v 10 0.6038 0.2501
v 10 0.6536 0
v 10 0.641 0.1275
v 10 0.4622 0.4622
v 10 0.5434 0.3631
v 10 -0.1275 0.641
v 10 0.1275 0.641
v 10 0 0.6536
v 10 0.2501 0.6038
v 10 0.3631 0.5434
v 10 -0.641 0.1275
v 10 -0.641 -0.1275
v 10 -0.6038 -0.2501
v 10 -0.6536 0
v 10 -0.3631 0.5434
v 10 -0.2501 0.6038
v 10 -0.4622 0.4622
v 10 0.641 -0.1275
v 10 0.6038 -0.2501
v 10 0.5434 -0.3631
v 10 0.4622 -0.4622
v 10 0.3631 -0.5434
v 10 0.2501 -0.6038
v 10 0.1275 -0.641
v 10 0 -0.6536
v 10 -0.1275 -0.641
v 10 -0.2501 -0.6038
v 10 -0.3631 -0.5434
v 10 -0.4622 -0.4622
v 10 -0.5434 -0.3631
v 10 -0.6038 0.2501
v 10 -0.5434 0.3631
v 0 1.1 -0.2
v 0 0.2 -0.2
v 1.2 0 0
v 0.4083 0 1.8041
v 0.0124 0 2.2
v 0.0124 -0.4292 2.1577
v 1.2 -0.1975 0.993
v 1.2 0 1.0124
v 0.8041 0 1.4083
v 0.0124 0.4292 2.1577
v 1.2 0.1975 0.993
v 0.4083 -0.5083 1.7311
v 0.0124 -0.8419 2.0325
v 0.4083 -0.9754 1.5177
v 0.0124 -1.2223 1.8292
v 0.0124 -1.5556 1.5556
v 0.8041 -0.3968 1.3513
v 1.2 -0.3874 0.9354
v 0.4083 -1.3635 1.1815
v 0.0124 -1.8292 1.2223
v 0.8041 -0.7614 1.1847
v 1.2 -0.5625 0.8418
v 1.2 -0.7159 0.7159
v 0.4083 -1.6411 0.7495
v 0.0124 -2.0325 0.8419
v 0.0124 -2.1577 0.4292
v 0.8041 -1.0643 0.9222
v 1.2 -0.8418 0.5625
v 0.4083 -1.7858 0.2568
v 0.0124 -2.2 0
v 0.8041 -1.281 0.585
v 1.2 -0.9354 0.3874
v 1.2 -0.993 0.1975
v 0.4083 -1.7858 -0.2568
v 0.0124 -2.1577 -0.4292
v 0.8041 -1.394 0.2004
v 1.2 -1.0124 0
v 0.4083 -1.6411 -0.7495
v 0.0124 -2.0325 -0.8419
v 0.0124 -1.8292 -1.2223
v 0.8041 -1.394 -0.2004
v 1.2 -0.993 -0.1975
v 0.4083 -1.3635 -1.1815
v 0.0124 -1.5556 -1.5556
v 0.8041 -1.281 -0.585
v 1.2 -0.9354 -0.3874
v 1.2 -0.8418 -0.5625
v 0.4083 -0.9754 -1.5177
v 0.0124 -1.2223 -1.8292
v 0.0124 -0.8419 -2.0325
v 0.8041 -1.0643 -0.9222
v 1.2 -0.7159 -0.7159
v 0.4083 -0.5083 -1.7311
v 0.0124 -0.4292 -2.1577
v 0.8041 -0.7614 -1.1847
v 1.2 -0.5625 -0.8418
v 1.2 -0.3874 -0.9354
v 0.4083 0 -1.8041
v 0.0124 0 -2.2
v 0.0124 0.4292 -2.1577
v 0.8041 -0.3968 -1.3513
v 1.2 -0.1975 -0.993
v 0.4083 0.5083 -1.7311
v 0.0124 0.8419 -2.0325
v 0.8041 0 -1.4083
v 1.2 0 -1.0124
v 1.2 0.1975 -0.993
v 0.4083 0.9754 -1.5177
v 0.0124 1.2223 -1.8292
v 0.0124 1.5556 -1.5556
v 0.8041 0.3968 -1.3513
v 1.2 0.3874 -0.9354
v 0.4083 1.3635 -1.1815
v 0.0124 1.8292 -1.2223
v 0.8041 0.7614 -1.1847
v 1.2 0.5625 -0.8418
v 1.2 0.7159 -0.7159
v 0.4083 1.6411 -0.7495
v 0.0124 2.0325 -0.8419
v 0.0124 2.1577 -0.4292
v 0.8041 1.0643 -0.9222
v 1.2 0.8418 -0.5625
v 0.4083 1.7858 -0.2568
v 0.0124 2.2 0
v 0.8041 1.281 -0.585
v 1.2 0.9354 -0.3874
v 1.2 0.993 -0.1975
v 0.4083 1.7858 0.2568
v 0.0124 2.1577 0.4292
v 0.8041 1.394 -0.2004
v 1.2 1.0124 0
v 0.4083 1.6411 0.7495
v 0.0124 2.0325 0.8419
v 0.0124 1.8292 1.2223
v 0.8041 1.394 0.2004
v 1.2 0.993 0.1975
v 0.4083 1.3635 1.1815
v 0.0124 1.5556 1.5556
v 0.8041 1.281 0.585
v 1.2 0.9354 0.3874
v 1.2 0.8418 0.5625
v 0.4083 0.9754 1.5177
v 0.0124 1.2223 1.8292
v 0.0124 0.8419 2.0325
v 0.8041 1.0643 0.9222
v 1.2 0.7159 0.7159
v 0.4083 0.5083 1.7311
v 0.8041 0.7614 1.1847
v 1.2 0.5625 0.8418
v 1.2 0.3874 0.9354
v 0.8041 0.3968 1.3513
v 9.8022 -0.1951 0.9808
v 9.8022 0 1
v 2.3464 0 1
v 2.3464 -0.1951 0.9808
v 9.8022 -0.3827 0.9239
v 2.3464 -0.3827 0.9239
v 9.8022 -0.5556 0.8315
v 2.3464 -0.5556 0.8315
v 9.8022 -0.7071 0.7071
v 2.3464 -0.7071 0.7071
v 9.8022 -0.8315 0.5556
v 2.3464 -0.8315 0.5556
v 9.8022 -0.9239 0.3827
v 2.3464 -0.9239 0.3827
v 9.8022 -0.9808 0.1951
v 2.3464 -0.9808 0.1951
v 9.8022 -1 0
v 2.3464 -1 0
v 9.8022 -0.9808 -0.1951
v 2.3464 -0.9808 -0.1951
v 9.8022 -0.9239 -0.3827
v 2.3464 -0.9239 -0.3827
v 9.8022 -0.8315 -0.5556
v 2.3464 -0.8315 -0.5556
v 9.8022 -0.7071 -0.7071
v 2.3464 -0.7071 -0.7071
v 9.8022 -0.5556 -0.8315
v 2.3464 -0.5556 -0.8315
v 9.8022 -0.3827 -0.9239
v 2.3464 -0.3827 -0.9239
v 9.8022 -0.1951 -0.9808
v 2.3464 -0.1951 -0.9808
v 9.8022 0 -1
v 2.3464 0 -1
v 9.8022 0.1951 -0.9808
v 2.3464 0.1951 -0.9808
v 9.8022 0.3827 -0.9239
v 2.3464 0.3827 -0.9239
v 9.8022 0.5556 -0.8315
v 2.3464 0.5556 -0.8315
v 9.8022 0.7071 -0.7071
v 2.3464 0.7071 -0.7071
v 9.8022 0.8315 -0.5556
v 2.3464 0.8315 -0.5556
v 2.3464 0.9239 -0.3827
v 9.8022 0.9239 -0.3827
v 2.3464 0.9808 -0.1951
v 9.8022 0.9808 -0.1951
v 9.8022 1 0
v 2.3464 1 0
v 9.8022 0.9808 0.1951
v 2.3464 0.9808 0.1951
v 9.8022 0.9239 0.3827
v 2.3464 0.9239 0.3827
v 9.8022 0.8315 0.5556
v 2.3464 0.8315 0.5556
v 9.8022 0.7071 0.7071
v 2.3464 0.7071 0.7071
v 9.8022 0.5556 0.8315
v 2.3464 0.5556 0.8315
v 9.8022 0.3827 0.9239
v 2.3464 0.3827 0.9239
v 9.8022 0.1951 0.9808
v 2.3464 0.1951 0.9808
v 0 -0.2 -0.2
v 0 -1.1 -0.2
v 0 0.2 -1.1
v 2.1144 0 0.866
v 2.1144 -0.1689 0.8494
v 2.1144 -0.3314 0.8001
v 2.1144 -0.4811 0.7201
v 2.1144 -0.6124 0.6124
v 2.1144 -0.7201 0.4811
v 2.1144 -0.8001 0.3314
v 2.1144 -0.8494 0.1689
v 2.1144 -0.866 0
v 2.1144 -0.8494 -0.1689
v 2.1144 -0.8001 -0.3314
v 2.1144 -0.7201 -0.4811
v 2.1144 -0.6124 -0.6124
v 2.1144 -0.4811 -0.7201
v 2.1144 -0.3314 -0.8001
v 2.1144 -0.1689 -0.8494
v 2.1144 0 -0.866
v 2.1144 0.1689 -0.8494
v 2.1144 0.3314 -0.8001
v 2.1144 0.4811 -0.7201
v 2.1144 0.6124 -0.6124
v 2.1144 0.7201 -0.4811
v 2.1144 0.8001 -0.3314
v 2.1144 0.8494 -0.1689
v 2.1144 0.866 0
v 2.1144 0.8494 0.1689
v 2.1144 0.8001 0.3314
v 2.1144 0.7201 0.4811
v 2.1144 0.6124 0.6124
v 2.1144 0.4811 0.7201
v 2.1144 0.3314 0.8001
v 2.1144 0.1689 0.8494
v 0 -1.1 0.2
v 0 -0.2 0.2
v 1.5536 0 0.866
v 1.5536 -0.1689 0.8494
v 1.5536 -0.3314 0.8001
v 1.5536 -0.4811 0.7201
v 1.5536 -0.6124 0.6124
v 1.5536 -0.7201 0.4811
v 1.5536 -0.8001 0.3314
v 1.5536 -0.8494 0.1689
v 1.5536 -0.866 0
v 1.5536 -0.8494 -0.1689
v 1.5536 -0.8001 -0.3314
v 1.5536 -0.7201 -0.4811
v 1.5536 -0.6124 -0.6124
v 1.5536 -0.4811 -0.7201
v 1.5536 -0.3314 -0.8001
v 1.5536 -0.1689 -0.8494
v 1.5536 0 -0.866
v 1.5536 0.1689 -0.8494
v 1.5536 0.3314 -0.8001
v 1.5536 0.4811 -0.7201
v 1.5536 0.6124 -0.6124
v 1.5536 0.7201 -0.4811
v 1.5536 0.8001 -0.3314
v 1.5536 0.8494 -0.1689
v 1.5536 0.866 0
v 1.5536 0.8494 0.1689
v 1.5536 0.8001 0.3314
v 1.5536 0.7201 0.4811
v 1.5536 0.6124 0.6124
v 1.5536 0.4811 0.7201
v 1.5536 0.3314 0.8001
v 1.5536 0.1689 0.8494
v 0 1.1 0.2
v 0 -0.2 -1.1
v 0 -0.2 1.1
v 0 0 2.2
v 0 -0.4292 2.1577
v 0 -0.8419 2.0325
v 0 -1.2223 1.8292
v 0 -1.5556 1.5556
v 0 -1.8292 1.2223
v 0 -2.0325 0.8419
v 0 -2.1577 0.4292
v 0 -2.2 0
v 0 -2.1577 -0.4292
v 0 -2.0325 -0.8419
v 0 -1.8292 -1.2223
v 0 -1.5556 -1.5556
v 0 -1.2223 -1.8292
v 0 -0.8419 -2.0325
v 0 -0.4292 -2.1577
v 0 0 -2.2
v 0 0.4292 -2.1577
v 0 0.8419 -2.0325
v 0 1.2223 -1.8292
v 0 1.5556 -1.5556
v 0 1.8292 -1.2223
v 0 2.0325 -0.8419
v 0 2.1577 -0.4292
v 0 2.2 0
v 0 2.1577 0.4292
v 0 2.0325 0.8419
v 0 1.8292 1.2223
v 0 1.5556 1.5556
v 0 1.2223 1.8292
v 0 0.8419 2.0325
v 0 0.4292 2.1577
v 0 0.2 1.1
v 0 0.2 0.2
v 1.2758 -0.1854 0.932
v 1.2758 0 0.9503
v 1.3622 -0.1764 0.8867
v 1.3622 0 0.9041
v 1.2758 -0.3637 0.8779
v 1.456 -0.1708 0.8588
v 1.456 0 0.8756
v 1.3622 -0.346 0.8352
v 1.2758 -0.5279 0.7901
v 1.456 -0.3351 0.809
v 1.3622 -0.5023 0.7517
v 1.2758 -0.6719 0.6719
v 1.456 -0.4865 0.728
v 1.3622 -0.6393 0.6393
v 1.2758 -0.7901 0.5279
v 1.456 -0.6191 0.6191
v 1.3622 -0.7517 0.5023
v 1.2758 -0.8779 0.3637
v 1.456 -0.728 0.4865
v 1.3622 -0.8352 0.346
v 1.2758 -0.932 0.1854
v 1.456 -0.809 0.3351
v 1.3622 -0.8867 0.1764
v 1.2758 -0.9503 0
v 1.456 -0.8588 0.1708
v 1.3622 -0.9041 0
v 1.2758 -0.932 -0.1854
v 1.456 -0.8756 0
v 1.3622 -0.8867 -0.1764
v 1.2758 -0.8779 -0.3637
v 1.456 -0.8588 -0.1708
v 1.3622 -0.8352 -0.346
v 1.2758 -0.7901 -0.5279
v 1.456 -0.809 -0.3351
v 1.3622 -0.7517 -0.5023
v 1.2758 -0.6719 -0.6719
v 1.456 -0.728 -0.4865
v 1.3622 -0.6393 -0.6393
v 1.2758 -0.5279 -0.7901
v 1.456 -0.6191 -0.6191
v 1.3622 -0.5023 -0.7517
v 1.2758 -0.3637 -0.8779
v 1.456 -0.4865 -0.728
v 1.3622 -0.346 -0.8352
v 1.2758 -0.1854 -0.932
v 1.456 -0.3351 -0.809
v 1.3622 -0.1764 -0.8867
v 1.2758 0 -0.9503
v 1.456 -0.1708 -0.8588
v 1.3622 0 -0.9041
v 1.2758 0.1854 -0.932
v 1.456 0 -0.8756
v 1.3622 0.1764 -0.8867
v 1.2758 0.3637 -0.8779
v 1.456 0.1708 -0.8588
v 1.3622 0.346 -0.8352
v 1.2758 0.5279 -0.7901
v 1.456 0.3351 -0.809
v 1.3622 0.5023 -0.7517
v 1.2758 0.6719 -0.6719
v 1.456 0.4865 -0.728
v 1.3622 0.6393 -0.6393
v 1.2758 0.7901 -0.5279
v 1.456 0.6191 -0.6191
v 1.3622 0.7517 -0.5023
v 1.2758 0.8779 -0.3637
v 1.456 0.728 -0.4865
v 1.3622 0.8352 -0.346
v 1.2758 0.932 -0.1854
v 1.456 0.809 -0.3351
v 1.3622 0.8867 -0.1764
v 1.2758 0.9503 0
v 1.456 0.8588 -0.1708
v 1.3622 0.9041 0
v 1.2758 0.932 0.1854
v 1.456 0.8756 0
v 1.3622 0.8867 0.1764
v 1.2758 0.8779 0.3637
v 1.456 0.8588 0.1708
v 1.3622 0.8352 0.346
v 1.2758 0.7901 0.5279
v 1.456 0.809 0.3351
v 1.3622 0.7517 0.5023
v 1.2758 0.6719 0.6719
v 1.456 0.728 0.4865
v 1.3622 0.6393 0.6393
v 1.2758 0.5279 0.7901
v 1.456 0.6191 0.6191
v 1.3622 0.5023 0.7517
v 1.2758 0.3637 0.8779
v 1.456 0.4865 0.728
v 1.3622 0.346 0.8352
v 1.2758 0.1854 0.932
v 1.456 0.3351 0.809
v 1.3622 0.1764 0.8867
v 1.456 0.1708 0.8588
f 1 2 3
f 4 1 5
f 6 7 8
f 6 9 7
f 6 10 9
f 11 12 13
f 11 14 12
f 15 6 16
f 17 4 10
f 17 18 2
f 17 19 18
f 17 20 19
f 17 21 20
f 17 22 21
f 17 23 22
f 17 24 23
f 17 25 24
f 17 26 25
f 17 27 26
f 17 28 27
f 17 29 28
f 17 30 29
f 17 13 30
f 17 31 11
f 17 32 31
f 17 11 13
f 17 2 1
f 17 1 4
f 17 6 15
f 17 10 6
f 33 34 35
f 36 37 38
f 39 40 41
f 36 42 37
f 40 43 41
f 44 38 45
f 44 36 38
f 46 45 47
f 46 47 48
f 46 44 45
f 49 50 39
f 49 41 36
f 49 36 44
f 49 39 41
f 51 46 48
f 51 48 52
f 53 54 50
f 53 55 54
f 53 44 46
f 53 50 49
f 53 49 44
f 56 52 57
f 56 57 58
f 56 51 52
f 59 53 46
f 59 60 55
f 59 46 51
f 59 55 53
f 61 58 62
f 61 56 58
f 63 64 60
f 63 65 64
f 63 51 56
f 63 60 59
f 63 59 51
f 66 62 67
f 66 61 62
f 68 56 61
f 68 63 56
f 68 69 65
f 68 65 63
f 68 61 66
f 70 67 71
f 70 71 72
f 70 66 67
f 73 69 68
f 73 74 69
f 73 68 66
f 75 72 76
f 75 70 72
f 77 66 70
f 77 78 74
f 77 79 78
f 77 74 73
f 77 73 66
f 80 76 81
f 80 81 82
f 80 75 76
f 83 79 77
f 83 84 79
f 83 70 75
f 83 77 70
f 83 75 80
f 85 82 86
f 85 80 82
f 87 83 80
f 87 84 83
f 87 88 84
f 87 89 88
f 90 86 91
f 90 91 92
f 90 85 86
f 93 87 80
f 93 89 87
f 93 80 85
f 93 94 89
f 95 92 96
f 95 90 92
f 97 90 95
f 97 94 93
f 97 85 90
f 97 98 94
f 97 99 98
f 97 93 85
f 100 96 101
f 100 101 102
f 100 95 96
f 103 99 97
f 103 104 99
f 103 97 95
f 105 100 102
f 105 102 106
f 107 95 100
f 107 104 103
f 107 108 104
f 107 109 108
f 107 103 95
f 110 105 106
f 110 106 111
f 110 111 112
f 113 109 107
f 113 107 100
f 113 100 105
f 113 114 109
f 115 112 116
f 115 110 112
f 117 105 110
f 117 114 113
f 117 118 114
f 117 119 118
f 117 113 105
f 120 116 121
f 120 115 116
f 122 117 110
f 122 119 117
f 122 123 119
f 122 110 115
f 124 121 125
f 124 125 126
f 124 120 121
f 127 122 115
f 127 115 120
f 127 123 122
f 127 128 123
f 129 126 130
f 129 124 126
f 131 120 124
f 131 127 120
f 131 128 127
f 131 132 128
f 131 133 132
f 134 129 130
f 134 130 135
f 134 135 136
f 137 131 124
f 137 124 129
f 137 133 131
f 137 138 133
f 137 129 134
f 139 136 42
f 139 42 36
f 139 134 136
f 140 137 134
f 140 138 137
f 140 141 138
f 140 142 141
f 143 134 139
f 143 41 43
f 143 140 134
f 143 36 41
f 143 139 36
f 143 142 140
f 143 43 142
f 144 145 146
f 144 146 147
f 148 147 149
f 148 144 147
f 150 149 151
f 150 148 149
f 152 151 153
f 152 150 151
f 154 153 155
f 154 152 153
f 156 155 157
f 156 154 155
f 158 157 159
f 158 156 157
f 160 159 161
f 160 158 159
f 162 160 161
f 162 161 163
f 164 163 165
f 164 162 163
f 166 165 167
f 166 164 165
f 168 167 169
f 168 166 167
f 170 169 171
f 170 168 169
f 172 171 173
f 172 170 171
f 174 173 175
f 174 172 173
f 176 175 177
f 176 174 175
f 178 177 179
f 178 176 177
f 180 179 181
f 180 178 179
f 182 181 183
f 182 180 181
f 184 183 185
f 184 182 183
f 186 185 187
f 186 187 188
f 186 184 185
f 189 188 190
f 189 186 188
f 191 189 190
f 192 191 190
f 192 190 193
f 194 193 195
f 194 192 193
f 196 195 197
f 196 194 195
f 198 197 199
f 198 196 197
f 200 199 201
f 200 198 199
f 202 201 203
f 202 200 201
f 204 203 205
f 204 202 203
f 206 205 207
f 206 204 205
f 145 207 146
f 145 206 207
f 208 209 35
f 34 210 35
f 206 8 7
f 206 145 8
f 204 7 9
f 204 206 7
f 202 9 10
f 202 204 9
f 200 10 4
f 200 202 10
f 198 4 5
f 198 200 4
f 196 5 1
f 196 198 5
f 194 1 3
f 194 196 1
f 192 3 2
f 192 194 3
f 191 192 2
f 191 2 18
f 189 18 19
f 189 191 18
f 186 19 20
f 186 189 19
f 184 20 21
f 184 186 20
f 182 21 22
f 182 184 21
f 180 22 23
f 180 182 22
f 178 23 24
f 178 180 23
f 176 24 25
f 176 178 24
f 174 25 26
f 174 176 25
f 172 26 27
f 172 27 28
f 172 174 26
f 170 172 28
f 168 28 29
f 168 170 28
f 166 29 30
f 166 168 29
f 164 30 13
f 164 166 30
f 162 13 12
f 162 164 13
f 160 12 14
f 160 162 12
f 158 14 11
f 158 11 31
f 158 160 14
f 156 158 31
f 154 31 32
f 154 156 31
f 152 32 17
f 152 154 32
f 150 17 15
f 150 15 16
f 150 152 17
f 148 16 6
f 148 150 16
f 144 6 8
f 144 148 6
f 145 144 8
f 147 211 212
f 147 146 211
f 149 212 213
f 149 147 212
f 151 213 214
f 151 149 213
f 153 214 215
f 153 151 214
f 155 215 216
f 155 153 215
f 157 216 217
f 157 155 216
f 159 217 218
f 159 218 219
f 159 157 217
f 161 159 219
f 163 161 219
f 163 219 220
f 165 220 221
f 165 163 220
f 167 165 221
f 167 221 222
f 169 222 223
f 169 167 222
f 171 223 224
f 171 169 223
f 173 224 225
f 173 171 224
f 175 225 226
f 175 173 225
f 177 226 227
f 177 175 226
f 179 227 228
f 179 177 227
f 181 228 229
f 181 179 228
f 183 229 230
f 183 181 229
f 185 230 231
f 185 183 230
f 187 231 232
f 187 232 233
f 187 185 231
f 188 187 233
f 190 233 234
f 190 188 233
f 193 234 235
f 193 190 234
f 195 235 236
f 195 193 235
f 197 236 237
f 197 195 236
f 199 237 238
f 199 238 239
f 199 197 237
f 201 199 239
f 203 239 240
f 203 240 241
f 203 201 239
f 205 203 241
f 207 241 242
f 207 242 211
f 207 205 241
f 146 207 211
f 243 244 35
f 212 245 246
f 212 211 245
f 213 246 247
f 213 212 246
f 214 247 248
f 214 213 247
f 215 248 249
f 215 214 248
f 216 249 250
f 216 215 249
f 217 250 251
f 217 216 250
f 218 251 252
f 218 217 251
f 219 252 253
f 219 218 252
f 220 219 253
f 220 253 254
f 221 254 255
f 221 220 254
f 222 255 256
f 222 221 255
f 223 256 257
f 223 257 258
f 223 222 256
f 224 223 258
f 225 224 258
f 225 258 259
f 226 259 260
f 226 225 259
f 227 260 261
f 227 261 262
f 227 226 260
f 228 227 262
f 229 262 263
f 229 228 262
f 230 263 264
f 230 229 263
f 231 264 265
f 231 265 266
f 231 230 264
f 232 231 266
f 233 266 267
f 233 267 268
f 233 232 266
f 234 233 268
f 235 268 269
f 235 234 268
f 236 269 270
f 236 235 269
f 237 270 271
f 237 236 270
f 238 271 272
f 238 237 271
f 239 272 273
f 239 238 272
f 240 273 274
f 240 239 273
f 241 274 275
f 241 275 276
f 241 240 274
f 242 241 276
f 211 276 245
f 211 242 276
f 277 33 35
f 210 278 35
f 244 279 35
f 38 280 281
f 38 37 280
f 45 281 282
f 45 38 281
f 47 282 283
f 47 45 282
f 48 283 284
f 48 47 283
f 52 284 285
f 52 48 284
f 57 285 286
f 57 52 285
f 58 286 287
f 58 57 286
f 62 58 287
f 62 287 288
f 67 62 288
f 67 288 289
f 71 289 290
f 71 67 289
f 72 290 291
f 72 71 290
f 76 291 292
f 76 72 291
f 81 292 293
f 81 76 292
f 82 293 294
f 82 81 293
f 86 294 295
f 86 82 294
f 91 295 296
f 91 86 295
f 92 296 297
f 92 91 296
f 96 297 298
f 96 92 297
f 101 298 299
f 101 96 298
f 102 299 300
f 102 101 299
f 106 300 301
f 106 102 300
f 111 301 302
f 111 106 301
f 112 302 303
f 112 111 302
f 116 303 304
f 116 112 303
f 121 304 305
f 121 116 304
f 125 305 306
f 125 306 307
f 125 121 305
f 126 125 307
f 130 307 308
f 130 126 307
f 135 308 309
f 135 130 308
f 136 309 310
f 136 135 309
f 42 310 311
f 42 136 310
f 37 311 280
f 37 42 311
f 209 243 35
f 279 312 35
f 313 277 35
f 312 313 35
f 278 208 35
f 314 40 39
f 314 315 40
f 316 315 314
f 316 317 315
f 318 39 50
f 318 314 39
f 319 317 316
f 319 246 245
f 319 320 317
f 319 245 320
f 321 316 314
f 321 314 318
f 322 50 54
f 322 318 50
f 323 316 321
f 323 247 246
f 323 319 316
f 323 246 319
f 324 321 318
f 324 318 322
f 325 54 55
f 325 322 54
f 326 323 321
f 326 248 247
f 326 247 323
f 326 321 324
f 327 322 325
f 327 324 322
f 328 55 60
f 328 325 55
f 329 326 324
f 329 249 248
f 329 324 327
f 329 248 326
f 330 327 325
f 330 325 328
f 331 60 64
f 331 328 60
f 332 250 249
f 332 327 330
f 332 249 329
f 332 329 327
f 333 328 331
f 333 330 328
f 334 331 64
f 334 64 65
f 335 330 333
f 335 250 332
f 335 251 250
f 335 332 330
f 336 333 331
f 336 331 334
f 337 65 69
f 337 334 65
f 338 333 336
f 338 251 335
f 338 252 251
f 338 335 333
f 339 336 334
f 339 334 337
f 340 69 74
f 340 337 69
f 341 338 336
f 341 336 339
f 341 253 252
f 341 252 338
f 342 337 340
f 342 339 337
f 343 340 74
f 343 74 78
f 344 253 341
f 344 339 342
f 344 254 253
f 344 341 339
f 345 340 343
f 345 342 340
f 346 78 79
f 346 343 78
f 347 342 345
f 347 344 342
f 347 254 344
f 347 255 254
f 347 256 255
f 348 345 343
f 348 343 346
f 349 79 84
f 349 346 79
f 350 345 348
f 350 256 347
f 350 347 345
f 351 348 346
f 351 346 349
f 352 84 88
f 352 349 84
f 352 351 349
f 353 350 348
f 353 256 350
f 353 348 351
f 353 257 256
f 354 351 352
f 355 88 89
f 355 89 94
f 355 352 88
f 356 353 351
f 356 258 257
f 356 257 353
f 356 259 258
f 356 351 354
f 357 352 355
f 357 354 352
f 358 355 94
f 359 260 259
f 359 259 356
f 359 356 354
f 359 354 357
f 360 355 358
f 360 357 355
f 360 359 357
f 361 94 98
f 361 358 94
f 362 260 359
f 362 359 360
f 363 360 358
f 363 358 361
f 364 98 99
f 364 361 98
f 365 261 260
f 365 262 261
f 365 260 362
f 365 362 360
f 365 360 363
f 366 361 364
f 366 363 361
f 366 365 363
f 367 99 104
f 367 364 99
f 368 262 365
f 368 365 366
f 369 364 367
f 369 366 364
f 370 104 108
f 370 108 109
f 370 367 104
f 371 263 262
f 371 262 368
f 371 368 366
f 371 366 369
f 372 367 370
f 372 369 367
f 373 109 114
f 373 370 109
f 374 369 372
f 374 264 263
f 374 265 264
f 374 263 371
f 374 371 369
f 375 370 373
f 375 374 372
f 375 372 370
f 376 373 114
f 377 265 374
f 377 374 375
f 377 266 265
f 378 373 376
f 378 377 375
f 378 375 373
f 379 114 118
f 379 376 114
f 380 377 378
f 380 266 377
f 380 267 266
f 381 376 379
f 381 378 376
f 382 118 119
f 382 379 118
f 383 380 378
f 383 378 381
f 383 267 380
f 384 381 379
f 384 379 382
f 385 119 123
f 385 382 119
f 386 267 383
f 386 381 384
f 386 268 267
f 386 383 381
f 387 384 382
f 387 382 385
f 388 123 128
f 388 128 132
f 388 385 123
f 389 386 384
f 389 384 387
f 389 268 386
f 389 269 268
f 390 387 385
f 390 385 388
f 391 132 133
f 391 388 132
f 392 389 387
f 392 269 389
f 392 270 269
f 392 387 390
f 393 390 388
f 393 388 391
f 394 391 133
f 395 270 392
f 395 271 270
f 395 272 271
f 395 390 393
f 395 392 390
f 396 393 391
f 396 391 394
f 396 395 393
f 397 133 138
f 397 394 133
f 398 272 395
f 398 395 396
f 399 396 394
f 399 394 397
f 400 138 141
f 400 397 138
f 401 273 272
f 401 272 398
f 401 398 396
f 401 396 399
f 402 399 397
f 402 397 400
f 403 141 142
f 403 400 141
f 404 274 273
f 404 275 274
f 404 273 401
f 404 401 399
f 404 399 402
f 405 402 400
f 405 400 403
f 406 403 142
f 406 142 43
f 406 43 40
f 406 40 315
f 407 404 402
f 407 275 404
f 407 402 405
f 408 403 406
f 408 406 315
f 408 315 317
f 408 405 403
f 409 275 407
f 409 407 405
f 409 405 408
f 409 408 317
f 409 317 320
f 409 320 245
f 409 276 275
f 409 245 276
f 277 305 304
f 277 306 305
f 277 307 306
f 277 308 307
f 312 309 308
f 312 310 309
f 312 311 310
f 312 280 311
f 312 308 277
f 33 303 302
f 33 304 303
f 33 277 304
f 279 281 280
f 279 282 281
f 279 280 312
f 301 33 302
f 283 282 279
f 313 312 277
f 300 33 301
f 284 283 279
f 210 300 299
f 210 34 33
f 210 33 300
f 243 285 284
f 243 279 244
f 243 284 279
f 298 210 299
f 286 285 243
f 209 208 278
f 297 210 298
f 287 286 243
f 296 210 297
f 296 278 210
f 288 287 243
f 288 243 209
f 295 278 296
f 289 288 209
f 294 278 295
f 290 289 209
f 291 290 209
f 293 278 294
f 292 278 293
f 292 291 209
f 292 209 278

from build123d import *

# Parameters (mm, degrees)
PATTERN_CIRCULAR_1_COUNT = 2
PATTERN_CIRCULAR_1_ANGLE = 90


with BuildPart() as part:
    # 草图1 → Revolve 766 (revolve)
    with BuildSketch(Plane.XY, mode=Mode.PRIVATE) as revolve_766_sk:
        with BuildLine():
            Line((0, 0), (0, 2.2))
            Line((0, 2.2), (0.012446609, 2.2))
            Line((0.012446609, 2.2), (1.2, 1.012446609))
            ThreePointArc((1.2, 1.012446609), (1.362211674, 0.904060234), (1.553553391, 0.866))
            Line((1.553553391, 0.866), (2.114351801, 0.866))
            Line((2.114351801, 0.866), (2.346446609, 1))
            Line((2.346446609, 1), (10, 1))
            Line((10, 1), (10, 0))
            Line((10, 0), (0, 0))
        make_face()
    revolve(revolve_766_sk.sketch.rotate(Axis((0, 0, 0), (1, 0, 0)), 90), axis=Axis((0, 0, 0), (1, 0, 0)))

    # 草图2 → 切除-旋转1 (revolve, cut)
    with BuildSketch(Plane.XY, mode=Mode.PRIVATE) as cut_revolve_1_sk:
        Polygon((9.802166402, 1), (10.202166402, 1), (10, 0.6536), align=None)
    revolve(cut_revolve_1_sk.sketch.rotate(Axis((0, 0, 0), (-1, 0, 0)), 270), axis=Axis((0, 0, 0), (-1, 0, 0)), mode=Mode.SUBTRACT)

    # 草图3 → 切除-放样1 section 0
    with BuildSketch(Plane.ZY, mode=Mode.PRIVATE) as loft_1_s0:
        with BuildLine():
            Line((-1.1, 0.2), (1.1, 0.2))
            Line((1.1, 0.2), (1.1, -0.2))
            Line((1.1, -0.2), (-1.1, -0.2))
            Line((-1.1, -0.2), (-1.1, 0.2))
        make_face()
    loft_1 = loft([loft_1_s0.sketch, Vertex(1.2, 0, 0)], mode=Mode.SUBTRACT)

    # 阵列(圆周)1: 切除-放样1 ×2 about axis
    pattern_circular_1_axis = Axis((0, 0, 0), (1, 0, 0))
    for i in range(1, PATTERN_CIRCULAR_1_COUNT):
        add(loft_1.rotate(pattern_circular_1_axis, i * PATTERN_CIRCULAR_1_ANGLE / (PATTERN_CIRCULAR_1_COUNT - 1)), mode=Mode.SUBTRACT)


solid = part.part
